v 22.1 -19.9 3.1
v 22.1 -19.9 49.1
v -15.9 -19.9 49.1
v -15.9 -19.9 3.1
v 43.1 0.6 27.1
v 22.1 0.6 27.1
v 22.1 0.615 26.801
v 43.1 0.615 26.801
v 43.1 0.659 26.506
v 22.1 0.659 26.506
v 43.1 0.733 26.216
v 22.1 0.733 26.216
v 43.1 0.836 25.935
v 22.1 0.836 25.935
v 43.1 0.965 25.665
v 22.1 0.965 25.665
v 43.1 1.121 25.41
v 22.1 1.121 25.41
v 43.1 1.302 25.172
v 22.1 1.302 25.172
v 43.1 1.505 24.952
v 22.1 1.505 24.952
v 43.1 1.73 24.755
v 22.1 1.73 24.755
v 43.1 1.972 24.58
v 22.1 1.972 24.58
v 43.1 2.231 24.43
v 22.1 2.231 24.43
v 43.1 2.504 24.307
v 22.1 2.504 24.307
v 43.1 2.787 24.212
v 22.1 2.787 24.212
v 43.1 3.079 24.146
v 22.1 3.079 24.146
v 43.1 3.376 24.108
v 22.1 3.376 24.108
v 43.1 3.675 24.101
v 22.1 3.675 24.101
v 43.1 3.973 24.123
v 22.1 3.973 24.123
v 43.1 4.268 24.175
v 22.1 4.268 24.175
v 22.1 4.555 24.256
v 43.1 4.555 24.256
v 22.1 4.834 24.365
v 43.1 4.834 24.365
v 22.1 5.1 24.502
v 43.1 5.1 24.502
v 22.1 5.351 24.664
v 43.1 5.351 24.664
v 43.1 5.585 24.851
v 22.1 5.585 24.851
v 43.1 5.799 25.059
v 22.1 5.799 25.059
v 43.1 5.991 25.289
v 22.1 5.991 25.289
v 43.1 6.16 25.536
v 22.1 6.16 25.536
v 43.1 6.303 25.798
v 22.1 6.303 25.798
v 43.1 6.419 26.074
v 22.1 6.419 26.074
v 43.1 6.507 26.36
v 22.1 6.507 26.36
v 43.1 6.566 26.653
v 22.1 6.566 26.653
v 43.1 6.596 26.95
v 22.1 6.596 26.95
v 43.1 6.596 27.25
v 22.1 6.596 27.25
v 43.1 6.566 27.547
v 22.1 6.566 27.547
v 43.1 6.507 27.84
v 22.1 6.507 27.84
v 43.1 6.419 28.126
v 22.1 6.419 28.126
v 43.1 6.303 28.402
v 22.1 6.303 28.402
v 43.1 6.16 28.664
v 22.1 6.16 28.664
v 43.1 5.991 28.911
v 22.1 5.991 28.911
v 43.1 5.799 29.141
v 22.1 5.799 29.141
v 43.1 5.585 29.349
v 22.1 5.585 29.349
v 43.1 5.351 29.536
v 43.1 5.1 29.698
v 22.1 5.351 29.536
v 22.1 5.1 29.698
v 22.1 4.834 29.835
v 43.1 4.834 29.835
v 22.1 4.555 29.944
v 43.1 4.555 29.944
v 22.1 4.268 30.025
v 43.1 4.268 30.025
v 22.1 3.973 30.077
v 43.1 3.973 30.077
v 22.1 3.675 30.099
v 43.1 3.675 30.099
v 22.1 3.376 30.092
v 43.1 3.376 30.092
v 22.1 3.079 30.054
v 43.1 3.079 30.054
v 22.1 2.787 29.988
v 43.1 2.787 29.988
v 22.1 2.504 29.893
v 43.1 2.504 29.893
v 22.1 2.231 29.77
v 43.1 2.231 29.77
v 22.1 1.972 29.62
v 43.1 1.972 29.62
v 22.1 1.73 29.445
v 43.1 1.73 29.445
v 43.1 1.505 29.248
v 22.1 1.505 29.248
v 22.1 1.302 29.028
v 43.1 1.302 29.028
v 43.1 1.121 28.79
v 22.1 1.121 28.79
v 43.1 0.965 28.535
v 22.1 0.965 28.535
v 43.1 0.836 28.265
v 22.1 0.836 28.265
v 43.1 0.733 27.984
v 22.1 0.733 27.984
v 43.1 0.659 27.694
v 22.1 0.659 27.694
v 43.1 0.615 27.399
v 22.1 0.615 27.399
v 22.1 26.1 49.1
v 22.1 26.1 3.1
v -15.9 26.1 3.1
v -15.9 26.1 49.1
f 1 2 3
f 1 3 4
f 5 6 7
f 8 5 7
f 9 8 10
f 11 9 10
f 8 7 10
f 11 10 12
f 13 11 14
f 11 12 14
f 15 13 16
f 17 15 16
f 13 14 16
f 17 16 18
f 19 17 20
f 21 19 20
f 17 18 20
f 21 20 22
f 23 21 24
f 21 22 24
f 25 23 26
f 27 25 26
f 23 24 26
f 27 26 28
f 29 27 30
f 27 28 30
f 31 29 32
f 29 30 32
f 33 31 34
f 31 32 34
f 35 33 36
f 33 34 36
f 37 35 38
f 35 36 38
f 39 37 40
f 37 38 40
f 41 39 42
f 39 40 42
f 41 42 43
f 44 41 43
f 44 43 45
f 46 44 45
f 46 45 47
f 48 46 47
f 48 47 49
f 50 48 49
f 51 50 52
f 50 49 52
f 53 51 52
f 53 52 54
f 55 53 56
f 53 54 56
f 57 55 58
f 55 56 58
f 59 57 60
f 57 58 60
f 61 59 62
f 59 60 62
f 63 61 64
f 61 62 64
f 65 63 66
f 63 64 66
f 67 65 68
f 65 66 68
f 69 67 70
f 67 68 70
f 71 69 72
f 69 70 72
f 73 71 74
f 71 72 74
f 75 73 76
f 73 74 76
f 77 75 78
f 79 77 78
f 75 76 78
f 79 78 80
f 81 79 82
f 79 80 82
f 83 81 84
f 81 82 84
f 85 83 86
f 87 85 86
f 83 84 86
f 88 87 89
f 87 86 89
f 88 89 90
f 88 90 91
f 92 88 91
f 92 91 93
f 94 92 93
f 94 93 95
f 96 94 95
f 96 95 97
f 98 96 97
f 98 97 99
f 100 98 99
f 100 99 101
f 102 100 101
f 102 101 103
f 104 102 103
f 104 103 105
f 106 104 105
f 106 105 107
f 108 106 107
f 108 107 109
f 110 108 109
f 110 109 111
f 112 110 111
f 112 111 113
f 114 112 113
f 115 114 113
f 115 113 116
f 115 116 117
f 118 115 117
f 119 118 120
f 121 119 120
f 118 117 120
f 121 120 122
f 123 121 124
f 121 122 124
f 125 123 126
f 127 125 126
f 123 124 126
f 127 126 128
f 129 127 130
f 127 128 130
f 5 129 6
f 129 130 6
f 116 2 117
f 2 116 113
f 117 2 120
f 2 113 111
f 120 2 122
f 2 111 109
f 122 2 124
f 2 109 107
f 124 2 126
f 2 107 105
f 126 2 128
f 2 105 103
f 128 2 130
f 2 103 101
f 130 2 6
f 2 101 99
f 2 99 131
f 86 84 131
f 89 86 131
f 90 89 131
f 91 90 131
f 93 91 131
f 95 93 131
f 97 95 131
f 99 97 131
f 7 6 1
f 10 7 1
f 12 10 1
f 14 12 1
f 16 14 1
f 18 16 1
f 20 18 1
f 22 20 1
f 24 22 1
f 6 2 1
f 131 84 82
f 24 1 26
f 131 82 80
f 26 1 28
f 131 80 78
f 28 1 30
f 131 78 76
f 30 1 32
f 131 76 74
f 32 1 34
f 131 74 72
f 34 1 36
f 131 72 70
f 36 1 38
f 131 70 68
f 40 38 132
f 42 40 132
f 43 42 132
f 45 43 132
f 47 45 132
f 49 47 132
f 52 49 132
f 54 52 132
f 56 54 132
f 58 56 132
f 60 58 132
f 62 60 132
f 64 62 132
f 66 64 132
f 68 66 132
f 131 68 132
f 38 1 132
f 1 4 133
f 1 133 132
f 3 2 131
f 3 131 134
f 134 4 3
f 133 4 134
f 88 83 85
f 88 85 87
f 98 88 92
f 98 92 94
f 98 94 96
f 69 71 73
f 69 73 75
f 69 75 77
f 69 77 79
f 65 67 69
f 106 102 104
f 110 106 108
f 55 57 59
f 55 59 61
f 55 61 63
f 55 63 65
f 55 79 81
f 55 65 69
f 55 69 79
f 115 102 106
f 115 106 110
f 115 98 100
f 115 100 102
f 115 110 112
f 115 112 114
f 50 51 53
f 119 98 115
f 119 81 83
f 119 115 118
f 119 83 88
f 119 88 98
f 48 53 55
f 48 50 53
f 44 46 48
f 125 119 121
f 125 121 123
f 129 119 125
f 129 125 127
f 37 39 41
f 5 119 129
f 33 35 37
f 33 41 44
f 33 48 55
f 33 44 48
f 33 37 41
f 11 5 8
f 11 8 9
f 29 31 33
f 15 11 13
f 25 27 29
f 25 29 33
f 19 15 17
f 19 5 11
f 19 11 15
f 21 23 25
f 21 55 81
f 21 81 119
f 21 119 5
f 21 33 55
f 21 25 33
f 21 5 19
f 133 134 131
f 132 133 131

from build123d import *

# Parameters (mm, degrees)
ESQUISSE1_W                   = 44.2
ESQUISSE1_H                   = 52.2
BOSS_EXTRU_1_DEPTH            = 52.2
ENL_V_MAT_EXTRU_2_DEPTH       = 74.209903702
ENL_V_MAT_EXTRU_2_DEPTH_BACK  = 44.2
ENL_V_MAT_EXTRU_3_DEPTH       = 74.209903702
ENL_V_MAT_EXTRU_3_DEPTH_BACK  = 44.2
ENL_V_MAT_EXTRU_4_DEPTH       = 78.059003368
ENL_V_MAT_EXTRU_4_DEPTH_BACK  = 46
ENL_V_MAT_EXTRU_5_DEPTH       = 78.059003368
ENL_V_MAT_EXTRU_5_DEPTH_BACK  = 46
ENL_V_MAT_EXTRU_7_DEPTH       = 45.550224466
ENL_V_MAT_EXTRU_7_DEPTH_BACK  = 45.550224466
ENL_V_MAT_EXTRU_8_DEPTH       = 78.059003368
ENL_V_MAT_EXTRU_8_DEPTH_BACK  = 46
ENL_V_MAT_EXTRU_9_DEPTH       = 75.993733072
ENL_V_MAT_EXTRU_9_DEPTH_BACK  = 46
ESQUISSE13_R                  = 3
BOSS_EXTRU_2_DEPTH            = 21
ENL_V_MAT_EXTRU_10_DEPTH      = 84.625713749
ENL_V_MAT_EXTRU_10_DEPTH_BACK = 49
ENL_V_MAT_EXTRU_11_DEPTH      = 82.074163579
ENL_V_MAT_EXTRU_11_DEPTH_BACK = 49


with BuildPart() as part:
    # Esquisse1 → Boss.-Extru.1 (new body)
    with BuildSketch(Plane.XY):
        Rectangle(ESQUISSE1_W, ESQUISSE1_H)
    extrude(amount=BOSS_EXTRU_1_DEPTH)

    # Esquisse2 → Enlèv. mat.-Extru.2 (cut, two sides: drawn at the far end of the back side and taken through both)
    with BuildSketch(Plane(origin=(22.1, 0, 0), x_dir=(0, 0, -1), z_dir=(1, 0, 0)).offset(-ENL_V_MAT_EXTRU_2_DEPTH_BACK)):
        Polygon((-201.352290675, -19.9), (-52.2, -19.9), (-28.55, -19.9), (-28.55, -21.45), (-32.25, -21.45), (-32.25, -22.45), (-28.745559959, -26.1), (74.553898465, -133.690091099), (-39.180744024, -409.461834307), (-315.086933163, -295.671743208), align=None)
    extrude(amount=ENL_V_MAT_EXTRU_2_DEPTH + ENL_V_MAT_EXTRU_2_DEPTH_BACK, mode=Mode.SUBTRACT)

    # Esquisse3 → Enlèv. mat.-Extru.3 (cut, two sides: drawn at the far end of the back side and taken through both)
    with BuildSketch(Plane(origin=(22.1, 0, 0), x_dir=(0, 0, -1), z_dir=(1, 0, 0)).offset(-ENL_V_MAT_EXTRU_3_DEPTH_BACK)):
        Polygon((149.152290675, -19.9), (0, -19.9), (-23.65, -19.9), (-23.65, -21.45), (-19.95, -21.45), (-19.95, -22.45), (-23.454440041, -26.1), (-126.753898465, -133.690091099), (-13.019255976, -409.461834307), (262.886933163, -295.671743208), align=None)
    extrude(amount=ENL_V_MAT_EXTRU_3_DEPTH + ENL_V_MAT_EXTRU_3_DEPTH_BACK, mode=Mode.SUBTRACT)

    # Esquisse4 → Enlèv. mat.-Extru.4 (cut, two sides: drawn at the far end of the back side and taken through both)
    with BuildSketch(Plane(origin=(0, 26.1, 0), x_dir=(1, 0, 0), z_dir=(0, 1, 0)).offset(-ENL_V_MAT_EXTRU_4_DEPTH_BACK)):
        Polygon((-15.9, -191.333109619), (-15.9, -52.2), (-15.9, -28.55), (-17.45, -28.55), (-17.45, -32.25), (-18.45, -32.25), (-22.1, -28.745559959), (-122.462816227, 67.614843274), (-379.791464965, -38.281593439), (-273.228648738, -297.229546332), align=None)
    extrude(amount=ENL_V_MAT_EXTRU_4_DEPTH + ENL_V_MAT_EXTRU_4_DEPTH_BACK, mode=Mode.SUBTRACT)

    # Esquisse5 → Enlèv. mat.-Extru.5 (cut, two sides: drawn at the far end of the back side and taken through both)
    with BuildSketch(Plane(origin=(0, 26.1, 0), x_dir=(1, 0, 0), z_dir=(0, 1, 0)).offset(-ENL_V_MAT_EXTRU_5_DEPTH_BACK)):
        Polygon((-15.9, 139.133109619), (-15.9, 0), (-15.9, -23.65), (-17.45, -23.65), (-17.45, -19.95), (-18.45, -19.95), (-22.1, -23.454440041), (-122.462816228, -119.814843274), (-379.791464965, -13.918406561), (-273.228648738, 245.029546332), align=None)
    extrude(amount=ENL_V_MAT_EXTRU_5_DEPTH + ENL_V_MAT_EXTRU_5_DEPTH_BACK, mode=Mode.SUBTRACT)

    # Esquisse6 → Enlèv. mat.-Extru.7 (cut, two sides: drawn at the far end of the back side and taken through both)
    with BuildSketch(Plane.XY.offset(28.55).offset(-ENL_V_MAT_EXTRU_7_DEPTH_BACK)):
        Polygon((-161.22284167, -19.9), (-22.1, -19.9), (-15.9, -19.9), (-15.9, -26.093649616), (-15.9, -165.216491285), (-212.645110561, -361.97019968), (-357.967952231, -216.653708395), align=None)
    extrude(amount=ENL_V_MAT_EXTRU_7_DEPTH + ENL_V_MAT_EXTRU_7_DEPTH_BACK, mode=Mode.SUBTRACT)

    # Esquisse11 → Enlèv. mat.-Extru.8 (cut, two sides: drawn at the far end of the back side and taken through both)
    with BuildSketch(Plane(origin=(0, 26.1, 0), x_dir=(1, 0, 0), z_dir=(0, 1, 0)).offset(-ENL_V_MAT_EXTRU_8_DEPTH_BACK)):
        Polygon((164.227968273, -49.1), (22.1, -49.1), (-15.9, -49.1), (-158.027968273, -49.1), (-158.027968273, -333.355936546), (164.227968273, -333.355936546), align=None)
    extrude(amount=ENL_V_MAT_EXTRU_8_DEPTH + ENL_V_MAT_EXTRU_8_DEPTH_BACK, mode=Mode.SUBTRACT)

    # Esquisse12 → Enlèv. mat.-Extru.9 (cut, two sides: drawn at the far end of the back side and taken through both)
    with BuildSketch(Plane(origin=(0, 26.1, 0), x_dir=(1, 0, 0), z_dir=(0, 1, 0)).offset(-ENL_V_MAT_EXTRU_9_DEPTH_BACK)):
        Polygon((159.687460199, -3.1), (22.1, -3.1), (-15.9, -3.1), (-153.487460199, -3.1), (-153.487460199, 272.074920398), (159.687460199, 272.074920398), align=None)
    extrude(amount=ENL_V_MAT_EXTRU_9_DEPTH + ENL_V_MAT_EXTRU_9_DEPTH_BACK, mode=Mode.SUBTRACT)

    # Esquisse13 → Boss.-Extru.2 (add)
    with BuildSketch(Plane(origin=(22.1, 0, 0), x_dir=(0, 0, -1), z_dir=(1, 0, 0))):
        with Locations(Location((-27.1, 3.6, 0), (0, 0, 270))):
            Circle(ESQUISSE13_R)
    extrude(amount=BOSS_EXTRU_2_DEPTH)

    # Esquisse15 → Enlèv. mat.-Extru.10 (cut, two sides: drawn at the far end of the back side and taken through both)
    with BuildSketch(Plane(origin=(0, 26.1, 0), x_dir=(1, 0, 0), z_dir=(0, 1, 0)).offset(-ENL_V_MAT_EXTRU_10_DEPTH_BACK)):
        Polygon((-15.9, 114.859960703), (-15.9, -23.65), (-15.9, -28.55), (-15.9, -167.059960703), (-292.919921407, -167.059960703), (-292.919921407, 114.859960703), align=None)
    extrude(amount=ENL_V_MAT_EXTRU_10_DEPTH + ENL_V_MAT_EXTRU_10_DEPTH_BACK, mode=Mode.SUBTRACT)

    # Esquisse16 → Enlèv. mat.-Extru.11 (cut, two sides: drawn at the far end of the back side and taken through both)
    with BuildSketch(Plane.ZY.offset(15.9).offset(-ENL_V_MAT_EXTRU_11_DEPTH_BACK)):
        Polygon((-91.491856556, -19.9), (23.65, -19.9), (28.55, -19.9), (143.691856556, -19.9), (143.691856556, -250.183713112), (-91.491856556, -250.183713112), align=None)
    extrude(amount=ENL_V_MAT_EXTRU_11_DEPTH + ENL_V_MAT_EXTRU_11_DEPTH_BACK, mode=Mode.SUBTRACT)


solid = part.part
